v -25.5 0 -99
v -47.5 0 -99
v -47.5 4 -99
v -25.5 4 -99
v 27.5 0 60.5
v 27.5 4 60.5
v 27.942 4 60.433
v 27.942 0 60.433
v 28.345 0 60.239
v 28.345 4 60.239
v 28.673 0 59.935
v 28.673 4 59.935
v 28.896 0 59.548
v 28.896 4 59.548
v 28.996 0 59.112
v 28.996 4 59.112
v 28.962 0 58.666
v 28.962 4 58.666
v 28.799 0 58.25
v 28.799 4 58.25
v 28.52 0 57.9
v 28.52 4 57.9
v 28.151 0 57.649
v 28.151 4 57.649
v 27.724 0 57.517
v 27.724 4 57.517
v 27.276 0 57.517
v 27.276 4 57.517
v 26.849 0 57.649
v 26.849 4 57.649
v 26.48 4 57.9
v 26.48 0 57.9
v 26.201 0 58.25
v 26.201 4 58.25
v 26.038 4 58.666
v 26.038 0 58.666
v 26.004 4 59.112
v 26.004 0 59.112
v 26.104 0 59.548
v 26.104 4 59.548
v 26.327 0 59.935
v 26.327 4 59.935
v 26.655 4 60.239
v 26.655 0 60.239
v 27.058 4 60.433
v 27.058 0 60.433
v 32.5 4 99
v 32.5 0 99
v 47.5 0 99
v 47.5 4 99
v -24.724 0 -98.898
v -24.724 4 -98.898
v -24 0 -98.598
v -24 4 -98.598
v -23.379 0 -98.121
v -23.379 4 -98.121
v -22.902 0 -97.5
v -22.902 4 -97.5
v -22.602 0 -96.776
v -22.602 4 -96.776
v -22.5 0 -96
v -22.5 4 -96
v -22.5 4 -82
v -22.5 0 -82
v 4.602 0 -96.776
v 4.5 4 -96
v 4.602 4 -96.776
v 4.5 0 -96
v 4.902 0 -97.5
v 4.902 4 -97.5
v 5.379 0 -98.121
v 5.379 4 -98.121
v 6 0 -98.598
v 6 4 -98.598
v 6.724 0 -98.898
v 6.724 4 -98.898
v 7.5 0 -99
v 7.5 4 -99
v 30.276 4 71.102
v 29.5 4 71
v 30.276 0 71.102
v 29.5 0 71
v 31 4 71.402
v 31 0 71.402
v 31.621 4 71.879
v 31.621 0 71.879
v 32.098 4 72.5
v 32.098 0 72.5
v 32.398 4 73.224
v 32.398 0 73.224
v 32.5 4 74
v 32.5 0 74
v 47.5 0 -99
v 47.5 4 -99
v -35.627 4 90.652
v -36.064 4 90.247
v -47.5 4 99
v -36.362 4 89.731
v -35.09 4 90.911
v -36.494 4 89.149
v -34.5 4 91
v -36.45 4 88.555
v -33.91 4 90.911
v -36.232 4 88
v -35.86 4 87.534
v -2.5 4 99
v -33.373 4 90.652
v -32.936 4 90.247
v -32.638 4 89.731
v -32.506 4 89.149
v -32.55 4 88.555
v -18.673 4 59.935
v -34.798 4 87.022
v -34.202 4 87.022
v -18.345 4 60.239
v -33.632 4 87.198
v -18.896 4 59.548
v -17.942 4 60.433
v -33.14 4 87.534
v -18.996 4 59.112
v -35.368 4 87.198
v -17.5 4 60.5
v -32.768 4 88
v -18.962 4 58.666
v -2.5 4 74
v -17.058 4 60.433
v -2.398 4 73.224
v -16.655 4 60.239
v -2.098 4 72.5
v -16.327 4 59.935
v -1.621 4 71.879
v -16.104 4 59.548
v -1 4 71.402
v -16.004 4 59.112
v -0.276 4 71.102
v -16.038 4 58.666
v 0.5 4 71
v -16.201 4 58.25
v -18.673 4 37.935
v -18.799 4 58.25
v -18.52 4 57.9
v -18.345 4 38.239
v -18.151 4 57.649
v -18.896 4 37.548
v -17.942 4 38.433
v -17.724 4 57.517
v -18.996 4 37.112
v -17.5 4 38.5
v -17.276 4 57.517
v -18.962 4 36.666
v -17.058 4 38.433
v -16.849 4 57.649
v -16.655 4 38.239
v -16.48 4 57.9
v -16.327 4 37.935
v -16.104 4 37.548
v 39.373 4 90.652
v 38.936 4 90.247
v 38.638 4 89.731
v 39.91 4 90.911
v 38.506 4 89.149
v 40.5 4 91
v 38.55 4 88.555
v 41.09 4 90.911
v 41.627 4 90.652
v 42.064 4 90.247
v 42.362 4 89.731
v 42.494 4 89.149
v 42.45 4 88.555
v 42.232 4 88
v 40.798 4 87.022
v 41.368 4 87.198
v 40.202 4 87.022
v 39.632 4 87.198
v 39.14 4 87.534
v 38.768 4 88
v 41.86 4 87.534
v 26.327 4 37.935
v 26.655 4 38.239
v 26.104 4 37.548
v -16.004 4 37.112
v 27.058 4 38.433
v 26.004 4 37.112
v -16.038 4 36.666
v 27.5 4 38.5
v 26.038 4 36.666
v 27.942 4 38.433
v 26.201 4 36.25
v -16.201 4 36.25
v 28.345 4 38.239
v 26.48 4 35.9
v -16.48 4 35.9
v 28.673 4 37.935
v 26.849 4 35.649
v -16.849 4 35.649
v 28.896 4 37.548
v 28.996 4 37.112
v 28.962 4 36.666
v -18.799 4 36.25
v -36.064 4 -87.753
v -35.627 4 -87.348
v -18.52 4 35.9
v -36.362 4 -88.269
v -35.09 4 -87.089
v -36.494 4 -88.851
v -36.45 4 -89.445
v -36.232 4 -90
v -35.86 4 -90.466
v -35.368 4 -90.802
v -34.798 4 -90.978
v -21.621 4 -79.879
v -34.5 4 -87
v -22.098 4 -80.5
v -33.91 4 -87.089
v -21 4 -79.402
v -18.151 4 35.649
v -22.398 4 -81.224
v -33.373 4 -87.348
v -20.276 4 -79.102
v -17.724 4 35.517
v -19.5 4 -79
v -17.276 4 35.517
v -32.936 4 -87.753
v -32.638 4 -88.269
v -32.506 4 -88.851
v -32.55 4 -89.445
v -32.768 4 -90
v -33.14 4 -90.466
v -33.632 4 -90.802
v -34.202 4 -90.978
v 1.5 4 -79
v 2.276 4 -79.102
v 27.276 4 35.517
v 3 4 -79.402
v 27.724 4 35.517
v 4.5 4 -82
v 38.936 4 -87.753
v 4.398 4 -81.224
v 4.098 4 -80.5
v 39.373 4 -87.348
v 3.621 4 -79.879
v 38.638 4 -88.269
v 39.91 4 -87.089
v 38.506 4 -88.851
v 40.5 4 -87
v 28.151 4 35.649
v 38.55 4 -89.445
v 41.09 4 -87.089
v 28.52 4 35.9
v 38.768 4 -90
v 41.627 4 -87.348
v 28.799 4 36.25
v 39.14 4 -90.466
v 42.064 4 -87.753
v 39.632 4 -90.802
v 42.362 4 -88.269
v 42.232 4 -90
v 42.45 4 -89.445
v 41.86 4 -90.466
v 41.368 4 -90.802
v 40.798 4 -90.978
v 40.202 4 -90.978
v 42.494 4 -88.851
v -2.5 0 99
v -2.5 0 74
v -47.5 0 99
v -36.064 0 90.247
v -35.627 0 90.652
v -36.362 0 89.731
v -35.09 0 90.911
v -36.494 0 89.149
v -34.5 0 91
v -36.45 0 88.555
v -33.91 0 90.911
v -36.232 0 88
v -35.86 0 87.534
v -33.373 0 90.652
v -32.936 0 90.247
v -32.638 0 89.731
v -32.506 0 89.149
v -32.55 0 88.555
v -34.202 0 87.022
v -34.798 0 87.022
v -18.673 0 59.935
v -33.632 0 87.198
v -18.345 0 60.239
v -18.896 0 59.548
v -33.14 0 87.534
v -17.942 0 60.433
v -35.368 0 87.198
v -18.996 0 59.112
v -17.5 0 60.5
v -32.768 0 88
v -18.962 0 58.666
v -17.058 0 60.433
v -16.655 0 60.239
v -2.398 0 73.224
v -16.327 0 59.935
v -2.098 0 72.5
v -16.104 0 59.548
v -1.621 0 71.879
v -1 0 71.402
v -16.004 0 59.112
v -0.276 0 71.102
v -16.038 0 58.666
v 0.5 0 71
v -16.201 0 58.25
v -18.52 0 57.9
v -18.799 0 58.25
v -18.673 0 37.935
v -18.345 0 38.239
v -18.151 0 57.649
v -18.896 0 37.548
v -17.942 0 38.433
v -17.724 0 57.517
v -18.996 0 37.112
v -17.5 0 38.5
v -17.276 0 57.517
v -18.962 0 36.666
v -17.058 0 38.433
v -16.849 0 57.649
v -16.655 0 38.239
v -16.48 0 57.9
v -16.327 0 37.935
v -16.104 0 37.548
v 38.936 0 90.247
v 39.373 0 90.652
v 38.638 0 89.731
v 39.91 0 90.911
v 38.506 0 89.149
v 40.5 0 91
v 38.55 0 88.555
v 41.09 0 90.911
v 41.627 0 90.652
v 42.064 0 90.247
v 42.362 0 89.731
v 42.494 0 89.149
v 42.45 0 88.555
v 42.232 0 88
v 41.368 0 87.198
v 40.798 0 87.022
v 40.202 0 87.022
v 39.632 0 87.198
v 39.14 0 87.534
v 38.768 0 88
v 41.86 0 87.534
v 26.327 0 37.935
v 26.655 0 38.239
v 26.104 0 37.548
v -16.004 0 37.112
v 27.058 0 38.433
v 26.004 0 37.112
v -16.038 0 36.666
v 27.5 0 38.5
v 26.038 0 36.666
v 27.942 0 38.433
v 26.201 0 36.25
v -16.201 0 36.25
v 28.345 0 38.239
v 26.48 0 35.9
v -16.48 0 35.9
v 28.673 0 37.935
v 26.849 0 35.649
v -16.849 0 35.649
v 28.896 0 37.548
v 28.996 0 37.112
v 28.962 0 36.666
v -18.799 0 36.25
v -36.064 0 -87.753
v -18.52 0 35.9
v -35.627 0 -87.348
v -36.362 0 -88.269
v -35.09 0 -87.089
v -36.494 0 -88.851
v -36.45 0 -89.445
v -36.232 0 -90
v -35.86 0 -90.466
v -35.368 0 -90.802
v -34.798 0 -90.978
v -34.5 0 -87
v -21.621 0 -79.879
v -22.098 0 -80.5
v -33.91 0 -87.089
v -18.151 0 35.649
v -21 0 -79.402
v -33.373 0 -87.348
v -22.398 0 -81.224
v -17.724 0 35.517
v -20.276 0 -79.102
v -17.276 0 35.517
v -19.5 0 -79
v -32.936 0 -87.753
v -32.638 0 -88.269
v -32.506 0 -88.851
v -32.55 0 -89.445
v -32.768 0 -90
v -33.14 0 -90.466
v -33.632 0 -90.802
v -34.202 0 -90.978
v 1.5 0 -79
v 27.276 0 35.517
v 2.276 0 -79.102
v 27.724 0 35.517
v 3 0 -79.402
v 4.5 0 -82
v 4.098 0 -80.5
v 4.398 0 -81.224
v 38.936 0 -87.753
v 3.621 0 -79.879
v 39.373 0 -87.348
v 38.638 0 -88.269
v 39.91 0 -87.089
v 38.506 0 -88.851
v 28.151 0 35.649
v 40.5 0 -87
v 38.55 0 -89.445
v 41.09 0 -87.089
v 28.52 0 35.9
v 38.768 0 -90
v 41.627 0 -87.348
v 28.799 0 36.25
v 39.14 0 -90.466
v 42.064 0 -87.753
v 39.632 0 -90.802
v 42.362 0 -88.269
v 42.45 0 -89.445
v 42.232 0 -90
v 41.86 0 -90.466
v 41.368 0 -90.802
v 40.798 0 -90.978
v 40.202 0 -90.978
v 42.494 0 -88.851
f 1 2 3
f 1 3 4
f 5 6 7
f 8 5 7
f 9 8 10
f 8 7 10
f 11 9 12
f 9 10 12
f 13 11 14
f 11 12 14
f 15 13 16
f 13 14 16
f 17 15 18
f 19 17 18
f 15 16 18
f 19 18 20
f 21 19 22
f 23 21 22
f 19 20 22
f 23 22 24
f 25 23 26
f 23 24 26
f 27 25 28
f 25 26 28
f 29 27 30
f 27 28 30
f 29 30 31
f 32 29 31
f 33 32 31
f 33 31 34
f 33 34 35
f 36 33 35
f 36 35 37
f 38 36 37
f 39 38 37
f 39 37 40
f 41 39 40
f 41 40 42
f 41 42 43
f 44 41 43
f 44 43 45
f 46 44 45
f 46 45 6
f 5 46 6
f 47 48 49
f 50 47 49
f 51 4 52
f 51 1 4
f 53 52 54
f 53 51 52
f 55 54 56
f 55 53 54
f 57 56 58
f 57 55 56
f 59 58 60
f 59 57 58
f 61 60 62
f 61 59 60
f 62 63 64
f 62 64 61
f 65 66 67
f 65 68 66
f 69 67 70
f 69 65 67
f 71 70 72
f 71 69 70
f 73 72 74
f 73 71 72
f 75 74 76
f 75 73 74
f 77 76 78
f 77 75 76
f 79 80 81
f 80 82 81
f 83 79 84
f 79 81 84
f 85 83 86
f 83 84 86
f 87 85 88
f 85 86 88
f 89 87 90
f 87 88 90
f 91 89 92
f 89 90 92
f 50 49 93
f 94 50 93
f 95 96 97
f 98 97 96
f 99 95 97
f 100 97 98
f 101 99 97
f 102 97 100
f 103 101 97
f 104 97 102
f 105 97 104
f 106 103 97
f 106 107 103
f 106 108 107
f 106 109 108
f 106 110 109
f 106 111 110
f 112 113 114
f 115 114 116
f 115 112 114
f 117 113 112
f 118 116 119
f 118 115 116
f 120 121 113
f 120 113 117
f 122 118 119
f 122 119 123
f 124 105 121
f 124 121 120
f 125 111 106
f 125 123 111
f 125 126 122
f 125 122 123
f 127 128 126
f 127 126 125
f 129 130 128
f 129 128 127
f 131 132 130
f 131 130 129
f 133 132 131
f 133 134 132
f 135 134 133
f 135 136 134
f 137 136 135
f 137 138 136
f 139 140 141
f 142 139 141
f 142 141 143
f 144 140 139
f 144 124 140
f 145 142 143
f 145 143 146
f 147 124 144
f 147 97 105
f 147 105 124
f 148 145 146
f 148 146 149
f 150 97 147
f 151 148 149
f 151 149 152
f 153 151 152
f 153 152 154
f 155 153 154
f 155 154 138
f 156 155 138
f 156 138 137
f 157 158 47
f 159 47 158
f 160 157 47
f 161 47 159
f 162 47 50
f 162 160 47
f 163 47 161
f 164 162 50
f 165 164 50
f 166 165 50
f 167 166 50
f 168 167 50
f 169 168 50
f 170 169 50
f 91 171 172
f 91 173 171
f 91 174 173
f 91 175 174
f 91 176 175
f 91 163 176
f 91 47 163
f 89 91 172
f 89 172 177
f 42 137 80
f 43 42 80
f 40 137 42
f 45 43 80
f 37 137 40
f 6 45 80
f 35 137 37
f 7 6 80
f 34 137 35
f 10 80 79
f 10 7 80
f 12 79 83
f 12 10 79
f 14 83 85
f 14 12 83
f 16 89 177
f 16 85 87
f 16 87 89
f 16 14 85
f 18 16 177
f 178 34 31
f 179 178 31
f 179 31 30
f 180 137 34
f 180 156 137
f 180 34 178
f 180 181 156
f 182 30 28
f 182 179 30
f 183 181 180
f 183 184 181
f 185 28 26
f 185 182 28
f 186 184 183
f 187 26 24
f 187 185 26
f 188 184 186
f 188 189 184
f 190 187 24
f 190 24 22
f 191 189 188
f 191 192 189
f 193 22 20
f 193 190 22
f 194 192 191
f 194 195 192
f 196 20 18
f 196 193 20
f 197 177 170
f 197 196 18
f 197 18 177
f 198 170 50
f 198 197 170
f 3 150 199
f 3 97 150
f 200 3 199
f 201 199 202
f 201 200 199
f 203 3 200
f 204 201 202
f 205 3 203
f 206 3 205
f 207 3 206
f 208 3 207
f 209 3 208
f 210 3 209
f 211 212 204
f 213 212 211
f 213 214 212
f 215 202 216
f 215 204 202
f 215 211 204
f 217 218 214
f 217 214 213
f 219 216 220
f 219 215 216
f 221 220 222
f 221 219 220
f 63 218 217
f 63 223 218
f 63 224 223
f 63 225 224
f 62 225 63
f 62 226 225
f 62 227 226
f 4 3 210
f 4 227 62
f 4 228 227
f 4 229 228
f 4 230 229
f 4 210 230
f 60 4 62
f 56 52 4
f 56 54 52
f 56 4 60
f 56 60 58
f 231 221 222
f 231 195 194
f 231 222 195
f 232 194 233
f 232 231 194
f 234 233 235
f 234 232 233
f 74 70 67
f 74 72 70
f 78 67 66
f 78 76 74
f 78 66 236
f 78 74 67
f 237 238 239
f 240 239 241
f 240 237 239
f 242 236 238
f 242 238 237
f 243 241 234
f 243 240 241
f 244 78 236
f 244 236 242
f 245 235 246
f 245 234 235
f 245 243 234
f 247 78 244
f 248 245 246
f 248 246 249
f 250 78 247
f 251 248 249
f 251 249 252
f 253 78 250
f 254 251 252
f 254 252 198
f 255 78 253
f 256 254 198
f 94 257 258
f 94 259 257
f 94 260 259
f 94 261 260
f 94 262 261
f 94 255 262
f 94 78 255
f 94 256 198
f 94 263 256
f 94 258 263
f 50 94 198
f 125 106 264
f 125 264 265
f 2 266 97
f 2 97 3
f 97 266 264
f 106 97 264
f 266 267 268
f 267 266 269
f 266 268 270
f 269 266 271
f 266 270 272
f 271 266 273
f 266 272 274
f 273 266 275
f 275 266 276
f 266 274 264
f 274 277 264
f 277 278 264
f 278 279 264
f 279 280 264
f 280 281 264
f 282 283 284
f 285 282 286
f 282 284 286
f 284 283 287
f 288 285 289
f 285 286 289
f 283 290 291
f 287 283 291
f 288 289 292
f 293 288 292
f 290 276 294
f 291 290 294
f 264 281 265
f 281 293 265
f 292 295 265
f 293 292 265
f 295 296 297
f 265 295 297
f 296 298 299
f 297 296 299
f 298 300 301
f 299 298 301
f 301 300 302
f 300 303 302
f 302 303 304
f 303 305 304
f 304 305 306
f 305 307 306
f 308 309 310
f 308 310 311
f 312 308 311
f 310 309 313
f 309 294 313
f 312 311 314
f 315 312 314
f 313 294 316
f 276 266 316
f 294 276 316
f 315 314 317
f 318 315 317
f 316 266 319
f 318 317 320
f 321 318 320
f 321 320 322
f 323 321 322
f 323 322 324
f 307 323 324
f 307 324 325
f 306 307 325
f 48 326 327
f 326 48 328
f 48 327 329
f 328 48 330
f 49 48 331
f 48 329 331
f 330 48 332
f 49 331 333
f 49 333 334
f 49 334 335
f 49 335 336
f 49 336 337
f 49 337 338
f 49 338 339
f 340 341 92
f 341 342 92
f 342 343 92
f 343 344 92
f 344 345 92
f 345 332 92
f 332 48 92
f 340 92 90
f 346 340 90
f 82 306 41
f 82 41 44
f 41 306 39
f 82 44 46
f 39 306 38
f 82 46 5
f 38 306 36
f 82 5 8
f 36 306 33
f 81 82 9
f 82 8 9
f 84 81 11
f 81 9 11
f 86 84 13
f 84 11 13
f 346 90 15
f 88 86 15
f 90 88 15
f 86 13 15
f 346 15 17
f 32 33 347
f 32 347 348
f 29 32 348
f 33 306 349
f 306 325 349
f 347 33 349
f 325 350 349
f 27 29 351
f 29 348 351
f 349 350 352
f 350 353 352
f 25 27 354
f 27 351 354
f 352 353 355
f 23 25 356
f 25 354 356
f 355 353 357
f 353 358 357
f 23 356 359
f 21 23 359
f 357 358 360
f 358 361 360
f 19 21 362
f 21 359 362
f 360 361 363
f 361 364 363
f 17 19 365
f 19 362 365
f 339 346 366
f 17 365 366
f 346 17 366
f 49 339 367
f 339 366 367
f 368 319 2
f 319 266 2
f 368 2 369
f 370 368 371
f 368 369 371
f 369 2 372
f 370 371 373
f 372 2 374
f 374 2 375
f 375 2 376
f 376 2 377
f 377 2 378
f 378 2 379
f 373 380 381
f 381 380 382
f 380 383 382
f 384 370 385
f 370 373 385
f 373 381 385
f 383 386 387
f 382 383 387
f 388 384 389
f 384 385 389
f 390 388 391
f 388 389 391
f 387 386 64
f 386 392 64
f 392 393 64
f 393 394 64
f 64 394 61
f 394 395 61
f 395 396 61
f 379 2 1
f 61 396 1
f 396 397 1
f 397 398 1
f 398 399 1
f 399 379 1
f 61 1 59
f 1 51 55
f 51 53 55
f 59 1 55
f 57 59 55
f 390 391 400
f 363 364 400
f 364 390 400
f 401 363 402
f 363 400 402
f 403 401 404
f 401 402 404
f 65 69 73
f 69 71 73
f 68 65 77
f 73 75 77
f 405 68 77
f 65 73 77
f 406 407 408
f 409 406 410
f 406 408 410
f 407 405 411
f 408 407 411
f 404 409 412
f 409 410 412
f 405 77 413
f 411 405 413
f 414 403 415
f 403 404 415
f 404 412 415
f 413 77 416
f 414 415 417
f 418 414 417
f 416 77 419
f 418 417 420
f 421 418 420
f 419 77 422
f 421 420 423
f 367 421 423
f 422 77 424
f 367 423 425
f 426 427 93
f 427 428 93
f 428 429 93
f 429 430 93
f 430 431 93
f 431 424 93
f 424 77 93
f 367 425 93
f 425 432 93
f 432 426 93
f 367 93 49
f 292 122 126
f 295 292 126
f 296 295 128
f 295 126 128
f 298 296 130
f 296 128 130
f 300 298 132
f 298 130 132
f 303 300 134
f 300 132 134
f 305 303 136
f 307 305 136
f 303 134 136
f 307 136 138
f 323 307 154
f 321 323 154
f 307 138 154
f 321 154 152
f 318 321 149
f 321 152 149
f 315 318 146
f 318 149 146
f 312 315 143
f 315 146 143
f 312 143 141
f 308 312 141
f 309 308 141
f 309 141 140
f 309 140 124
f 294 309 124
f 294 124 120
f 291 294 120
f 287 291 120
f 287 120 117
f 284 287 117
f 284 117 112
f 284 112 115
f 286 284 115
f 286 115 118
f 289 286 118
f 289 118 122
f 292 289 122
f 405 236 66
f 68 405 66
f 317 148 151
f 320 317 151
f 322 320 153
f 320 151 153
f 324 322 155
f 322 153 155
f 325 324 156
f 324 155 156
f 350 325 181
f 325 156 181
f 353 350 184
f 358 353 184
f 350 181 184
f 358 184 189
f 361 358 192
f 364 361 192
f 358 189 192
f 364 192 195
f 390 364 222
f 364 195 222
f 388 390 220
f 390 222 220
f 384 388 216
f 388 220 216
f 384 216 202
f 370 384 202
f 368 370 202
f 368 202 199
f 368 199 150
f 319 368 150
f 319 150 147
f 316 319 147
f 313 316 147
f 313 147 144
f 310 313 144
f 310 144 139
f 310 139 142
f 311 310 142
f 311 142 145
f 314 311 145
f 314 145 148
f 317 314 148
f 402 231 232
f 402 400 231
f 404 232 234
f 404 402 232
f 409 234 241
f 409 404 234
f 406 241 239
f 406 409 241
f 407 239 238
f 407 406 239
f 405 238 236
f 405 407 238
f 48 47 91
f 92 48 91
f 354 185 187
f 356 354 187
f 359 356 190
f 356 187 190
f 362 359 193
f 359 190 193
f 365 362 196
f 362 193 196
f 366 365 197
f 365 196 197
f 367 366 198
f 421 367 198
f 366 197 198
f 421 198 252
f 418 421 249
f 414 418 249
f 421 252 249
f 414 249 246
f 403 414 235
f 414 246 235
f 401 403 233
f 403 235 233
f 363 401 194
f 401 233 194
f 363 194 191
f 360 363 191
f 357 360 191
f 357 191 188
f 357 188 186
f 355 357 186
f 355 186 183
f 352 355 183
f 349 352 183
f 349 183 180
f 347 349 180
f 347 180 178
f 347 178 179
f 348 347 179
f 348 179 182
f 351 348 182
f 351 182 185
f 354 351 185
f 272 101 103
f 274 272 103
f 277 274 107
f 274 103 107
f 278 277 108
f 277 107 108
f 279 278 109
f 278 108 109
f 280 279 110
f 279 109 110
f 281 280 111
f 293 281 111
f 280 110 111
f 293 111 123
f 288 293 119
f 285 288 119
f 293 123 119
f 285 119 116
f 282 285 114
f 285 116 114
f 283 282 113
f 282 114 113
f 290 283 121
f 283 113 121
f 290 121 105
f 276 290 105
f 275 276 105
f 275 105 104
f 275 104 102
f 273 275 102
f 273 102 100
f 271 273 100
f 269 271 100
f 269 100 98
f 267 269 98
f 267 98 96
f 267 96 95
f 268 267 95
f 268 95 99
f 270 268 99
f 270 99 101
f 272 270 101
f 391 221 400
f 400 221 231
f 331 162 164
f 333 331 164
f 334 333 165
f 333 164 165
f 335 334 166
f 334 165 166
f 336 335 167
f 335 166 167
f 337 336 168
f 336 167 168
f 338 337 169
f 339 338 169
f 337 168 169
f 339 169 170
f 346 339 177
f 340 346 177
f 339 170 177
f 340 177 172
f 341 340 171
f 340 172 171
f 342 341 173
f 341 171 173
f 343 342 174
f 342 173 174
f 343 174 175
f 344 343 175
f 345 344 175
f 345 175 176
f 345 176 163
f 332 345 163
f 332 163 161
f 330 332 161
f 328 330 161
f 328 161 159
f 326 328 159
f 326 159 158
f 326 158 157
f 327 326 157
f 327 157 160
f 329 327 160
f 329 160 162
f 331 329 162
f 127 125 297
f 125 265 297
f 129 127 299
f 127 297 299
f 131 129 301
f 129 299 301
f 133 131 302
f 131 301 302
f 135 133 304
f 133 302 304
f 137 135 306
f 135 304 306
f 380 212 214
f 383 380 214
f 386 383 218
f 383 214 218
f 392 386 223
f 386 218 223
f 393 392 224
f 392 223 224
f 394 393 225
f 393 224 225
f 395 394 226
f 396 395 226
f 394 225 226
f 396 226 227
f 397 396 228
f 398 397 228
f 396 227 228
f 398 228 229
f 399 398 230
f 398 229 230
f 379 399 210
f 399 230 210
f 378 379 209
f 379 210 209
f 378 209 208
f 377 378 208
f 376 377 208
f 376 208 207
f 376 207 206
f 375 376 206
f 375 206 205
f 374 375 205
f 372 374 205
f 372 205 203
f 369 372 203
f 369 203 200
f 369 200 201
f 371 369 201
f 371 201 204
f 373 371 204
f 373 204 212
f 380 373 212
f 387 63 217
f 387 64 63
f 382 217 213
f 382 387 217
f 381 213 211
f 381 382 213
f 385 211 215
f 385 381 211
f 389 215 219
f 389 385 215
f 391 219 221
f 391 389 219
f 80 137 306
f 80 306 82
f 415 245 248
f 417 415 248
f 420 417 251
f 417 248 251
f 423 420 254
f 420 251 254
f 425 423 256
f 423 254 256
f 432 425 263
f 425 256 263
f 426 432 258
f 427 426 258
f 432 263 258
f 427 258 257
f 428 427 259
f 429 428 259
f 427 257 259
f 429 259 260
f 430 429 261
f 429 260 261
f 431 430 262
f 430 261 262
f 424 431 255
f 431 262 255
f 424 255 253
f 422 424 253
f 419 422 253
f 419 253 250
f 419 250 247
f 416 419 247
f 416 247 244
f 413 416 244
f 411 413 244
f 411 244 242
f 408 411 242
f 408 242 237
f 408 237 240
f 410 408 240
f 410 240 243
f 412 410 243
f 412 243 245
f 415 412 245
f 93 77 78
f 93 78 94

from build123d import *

# Parameters (mm, degrees)
SKETCH_1_W          = 95
SKETCH_1_H          = 198
EXTRUDE_1_DEPTH     = 4
SKETCH_2_W          = 35
SKETCH_2_H          = 28
CUT_EXTRUDE_1_DEPTH = 4
SKETCH_3_R          = 2
CUT_EXTRUDE_2_DEPTH = 110.878341815
SKETCH_4_R          = 2
CUT_EXTRUDE_3_DEPTH = 110.878341815
SKETCH_5_W          = 27
SKETCH_5_H          = 20
CUT_EXTRUDE_4_DEPTH = 110.878341815
SKETCH_6_R          = 1.5
CUT_EXTRUDE_5_DEPTH = 20
FILLET_1_R          = 3
FILLET_2_R          = 3


with BuildPart() as part:
    # 草图1 → 凸台-拉伸1 (new body)
    with BuildSketch(Plane(origin=(0, 0, 0), x_dir=(1, 0, 0), z_dir=(0, 1, 0))):
        Rectangle(SKETCH_1_W, SKETCH_1_H)
    extrude(amount=EXTRUDE_1_DEPTH)

    # 草图2 → 切除-拉伸1 (cut)
    with BuildSketch(Plane(origin=(0, 4, 0), x_dir=(1, 0, 0), z_dir=(0, 1, 0))):
        with Locations((15, -85)):
            Rectangle(SKETCH_2_W, SKETCH_2_H)
    extrude(amount=-CUT_EXTRUDE_1_DEPTH, mode=Mode.SUBTRACT)

    # 草图3 → 切除-拉伸2 (cut, through all)
    with BuildSketch(Plane(origin=(0, 4, 0), x_dir=(1, 0, 0), z_dir=(0, 1, 0))):
        with Locations(Location((40.5, -89, 0), (0, 0, 270))):
            Circle(SKETCH_3_R)
    extrude(amount=-CUT_EXTRUDE_2_DEPTH, mode=Mode.SUBTRACT)

    # 草图4 → 切除-拉伸3 (cut, through all)
    with BuildSketch(Plane(origin=(0, 4, 0), x_dir=(1, 0, 0), z_dir=(0, 1, 0))):
        with Locations(Location((40.5, 89, 0), (0, 0, 270))):
            Circle(SKETCH_4_R)
        with Locations(Location((-34.5, 89, 0), (0, 0, 270))):
            Circle(SKETCH_4_R)
        with Locations(Location((-34.5, -89, 0), (0, 0, 270))):
            Circle(SKETCH_4_R)
    extrude(amount=-CUT_EXTRUDE_3_DEPTH, mode=Mode.SUBTRACT)

    # 草图5 → 切除-拉伸4 (cut, through all)
    with BuildSketch(Plane(origin=(0, 4, 0), x_dir=(1, 0, 0), z_dir=(0, 1, 0))):
        with Locations((-9, 89)):
            Rectangle(SKETCH_5_W, SKETCH_5_H)
    extrude(amount=-CUT_EXTRUDE_4_DEPTH, mode=Mode.SUBTRACT)

    # 草图6 → 切除-拉伸5 (cut)
    with BuildSketch(Plane(origin=(0, 4, 0), x_dir=(1, 0, 0), z_dir=(0, 1, 0))):
        with Locations(Location((-17.5, -59, 0), (0, 0, 270))):
            Circle(SKETCH_6_R)
        with Locations(Location((27.5, -59, 0), (0, 0, 270))):
            Circle(SKETCH_6_R)
        with Locations(Location((27.5, -37, 0), (0, 0, 270))):
            Circle(SKETCH_6_R)
        with Locations(Location((-17.5, -37, 0), (0, 0, 270))):
            Circle(SKETCH_6_R)
    extrude(amount=-CUT_EXTRUDE_5_DEPTH, mode=Mode.SUBTRACT)

    # 圆角1
    fillet_1_edges = [part.edges().sort_by_distance(p)[0] for p in [
        (-2.5, 2, 71),
        (32.5, 2, 71),
    ]]
    fillet(fillet_1_edges, radius=FILLET_1_R)

    # 圆角2
    fillet_2_edges = [part.edges().sort_by_distance(p)[0] for p in [
        (-22.5, 2, -99),
        (4.5, 2, -99),
        (4.5, 2, -79),
        (-22.5, 2, -79),
    ]]
    fillet(fillet_2_edges, radius=FILLET_2_R)


solid = part.part
